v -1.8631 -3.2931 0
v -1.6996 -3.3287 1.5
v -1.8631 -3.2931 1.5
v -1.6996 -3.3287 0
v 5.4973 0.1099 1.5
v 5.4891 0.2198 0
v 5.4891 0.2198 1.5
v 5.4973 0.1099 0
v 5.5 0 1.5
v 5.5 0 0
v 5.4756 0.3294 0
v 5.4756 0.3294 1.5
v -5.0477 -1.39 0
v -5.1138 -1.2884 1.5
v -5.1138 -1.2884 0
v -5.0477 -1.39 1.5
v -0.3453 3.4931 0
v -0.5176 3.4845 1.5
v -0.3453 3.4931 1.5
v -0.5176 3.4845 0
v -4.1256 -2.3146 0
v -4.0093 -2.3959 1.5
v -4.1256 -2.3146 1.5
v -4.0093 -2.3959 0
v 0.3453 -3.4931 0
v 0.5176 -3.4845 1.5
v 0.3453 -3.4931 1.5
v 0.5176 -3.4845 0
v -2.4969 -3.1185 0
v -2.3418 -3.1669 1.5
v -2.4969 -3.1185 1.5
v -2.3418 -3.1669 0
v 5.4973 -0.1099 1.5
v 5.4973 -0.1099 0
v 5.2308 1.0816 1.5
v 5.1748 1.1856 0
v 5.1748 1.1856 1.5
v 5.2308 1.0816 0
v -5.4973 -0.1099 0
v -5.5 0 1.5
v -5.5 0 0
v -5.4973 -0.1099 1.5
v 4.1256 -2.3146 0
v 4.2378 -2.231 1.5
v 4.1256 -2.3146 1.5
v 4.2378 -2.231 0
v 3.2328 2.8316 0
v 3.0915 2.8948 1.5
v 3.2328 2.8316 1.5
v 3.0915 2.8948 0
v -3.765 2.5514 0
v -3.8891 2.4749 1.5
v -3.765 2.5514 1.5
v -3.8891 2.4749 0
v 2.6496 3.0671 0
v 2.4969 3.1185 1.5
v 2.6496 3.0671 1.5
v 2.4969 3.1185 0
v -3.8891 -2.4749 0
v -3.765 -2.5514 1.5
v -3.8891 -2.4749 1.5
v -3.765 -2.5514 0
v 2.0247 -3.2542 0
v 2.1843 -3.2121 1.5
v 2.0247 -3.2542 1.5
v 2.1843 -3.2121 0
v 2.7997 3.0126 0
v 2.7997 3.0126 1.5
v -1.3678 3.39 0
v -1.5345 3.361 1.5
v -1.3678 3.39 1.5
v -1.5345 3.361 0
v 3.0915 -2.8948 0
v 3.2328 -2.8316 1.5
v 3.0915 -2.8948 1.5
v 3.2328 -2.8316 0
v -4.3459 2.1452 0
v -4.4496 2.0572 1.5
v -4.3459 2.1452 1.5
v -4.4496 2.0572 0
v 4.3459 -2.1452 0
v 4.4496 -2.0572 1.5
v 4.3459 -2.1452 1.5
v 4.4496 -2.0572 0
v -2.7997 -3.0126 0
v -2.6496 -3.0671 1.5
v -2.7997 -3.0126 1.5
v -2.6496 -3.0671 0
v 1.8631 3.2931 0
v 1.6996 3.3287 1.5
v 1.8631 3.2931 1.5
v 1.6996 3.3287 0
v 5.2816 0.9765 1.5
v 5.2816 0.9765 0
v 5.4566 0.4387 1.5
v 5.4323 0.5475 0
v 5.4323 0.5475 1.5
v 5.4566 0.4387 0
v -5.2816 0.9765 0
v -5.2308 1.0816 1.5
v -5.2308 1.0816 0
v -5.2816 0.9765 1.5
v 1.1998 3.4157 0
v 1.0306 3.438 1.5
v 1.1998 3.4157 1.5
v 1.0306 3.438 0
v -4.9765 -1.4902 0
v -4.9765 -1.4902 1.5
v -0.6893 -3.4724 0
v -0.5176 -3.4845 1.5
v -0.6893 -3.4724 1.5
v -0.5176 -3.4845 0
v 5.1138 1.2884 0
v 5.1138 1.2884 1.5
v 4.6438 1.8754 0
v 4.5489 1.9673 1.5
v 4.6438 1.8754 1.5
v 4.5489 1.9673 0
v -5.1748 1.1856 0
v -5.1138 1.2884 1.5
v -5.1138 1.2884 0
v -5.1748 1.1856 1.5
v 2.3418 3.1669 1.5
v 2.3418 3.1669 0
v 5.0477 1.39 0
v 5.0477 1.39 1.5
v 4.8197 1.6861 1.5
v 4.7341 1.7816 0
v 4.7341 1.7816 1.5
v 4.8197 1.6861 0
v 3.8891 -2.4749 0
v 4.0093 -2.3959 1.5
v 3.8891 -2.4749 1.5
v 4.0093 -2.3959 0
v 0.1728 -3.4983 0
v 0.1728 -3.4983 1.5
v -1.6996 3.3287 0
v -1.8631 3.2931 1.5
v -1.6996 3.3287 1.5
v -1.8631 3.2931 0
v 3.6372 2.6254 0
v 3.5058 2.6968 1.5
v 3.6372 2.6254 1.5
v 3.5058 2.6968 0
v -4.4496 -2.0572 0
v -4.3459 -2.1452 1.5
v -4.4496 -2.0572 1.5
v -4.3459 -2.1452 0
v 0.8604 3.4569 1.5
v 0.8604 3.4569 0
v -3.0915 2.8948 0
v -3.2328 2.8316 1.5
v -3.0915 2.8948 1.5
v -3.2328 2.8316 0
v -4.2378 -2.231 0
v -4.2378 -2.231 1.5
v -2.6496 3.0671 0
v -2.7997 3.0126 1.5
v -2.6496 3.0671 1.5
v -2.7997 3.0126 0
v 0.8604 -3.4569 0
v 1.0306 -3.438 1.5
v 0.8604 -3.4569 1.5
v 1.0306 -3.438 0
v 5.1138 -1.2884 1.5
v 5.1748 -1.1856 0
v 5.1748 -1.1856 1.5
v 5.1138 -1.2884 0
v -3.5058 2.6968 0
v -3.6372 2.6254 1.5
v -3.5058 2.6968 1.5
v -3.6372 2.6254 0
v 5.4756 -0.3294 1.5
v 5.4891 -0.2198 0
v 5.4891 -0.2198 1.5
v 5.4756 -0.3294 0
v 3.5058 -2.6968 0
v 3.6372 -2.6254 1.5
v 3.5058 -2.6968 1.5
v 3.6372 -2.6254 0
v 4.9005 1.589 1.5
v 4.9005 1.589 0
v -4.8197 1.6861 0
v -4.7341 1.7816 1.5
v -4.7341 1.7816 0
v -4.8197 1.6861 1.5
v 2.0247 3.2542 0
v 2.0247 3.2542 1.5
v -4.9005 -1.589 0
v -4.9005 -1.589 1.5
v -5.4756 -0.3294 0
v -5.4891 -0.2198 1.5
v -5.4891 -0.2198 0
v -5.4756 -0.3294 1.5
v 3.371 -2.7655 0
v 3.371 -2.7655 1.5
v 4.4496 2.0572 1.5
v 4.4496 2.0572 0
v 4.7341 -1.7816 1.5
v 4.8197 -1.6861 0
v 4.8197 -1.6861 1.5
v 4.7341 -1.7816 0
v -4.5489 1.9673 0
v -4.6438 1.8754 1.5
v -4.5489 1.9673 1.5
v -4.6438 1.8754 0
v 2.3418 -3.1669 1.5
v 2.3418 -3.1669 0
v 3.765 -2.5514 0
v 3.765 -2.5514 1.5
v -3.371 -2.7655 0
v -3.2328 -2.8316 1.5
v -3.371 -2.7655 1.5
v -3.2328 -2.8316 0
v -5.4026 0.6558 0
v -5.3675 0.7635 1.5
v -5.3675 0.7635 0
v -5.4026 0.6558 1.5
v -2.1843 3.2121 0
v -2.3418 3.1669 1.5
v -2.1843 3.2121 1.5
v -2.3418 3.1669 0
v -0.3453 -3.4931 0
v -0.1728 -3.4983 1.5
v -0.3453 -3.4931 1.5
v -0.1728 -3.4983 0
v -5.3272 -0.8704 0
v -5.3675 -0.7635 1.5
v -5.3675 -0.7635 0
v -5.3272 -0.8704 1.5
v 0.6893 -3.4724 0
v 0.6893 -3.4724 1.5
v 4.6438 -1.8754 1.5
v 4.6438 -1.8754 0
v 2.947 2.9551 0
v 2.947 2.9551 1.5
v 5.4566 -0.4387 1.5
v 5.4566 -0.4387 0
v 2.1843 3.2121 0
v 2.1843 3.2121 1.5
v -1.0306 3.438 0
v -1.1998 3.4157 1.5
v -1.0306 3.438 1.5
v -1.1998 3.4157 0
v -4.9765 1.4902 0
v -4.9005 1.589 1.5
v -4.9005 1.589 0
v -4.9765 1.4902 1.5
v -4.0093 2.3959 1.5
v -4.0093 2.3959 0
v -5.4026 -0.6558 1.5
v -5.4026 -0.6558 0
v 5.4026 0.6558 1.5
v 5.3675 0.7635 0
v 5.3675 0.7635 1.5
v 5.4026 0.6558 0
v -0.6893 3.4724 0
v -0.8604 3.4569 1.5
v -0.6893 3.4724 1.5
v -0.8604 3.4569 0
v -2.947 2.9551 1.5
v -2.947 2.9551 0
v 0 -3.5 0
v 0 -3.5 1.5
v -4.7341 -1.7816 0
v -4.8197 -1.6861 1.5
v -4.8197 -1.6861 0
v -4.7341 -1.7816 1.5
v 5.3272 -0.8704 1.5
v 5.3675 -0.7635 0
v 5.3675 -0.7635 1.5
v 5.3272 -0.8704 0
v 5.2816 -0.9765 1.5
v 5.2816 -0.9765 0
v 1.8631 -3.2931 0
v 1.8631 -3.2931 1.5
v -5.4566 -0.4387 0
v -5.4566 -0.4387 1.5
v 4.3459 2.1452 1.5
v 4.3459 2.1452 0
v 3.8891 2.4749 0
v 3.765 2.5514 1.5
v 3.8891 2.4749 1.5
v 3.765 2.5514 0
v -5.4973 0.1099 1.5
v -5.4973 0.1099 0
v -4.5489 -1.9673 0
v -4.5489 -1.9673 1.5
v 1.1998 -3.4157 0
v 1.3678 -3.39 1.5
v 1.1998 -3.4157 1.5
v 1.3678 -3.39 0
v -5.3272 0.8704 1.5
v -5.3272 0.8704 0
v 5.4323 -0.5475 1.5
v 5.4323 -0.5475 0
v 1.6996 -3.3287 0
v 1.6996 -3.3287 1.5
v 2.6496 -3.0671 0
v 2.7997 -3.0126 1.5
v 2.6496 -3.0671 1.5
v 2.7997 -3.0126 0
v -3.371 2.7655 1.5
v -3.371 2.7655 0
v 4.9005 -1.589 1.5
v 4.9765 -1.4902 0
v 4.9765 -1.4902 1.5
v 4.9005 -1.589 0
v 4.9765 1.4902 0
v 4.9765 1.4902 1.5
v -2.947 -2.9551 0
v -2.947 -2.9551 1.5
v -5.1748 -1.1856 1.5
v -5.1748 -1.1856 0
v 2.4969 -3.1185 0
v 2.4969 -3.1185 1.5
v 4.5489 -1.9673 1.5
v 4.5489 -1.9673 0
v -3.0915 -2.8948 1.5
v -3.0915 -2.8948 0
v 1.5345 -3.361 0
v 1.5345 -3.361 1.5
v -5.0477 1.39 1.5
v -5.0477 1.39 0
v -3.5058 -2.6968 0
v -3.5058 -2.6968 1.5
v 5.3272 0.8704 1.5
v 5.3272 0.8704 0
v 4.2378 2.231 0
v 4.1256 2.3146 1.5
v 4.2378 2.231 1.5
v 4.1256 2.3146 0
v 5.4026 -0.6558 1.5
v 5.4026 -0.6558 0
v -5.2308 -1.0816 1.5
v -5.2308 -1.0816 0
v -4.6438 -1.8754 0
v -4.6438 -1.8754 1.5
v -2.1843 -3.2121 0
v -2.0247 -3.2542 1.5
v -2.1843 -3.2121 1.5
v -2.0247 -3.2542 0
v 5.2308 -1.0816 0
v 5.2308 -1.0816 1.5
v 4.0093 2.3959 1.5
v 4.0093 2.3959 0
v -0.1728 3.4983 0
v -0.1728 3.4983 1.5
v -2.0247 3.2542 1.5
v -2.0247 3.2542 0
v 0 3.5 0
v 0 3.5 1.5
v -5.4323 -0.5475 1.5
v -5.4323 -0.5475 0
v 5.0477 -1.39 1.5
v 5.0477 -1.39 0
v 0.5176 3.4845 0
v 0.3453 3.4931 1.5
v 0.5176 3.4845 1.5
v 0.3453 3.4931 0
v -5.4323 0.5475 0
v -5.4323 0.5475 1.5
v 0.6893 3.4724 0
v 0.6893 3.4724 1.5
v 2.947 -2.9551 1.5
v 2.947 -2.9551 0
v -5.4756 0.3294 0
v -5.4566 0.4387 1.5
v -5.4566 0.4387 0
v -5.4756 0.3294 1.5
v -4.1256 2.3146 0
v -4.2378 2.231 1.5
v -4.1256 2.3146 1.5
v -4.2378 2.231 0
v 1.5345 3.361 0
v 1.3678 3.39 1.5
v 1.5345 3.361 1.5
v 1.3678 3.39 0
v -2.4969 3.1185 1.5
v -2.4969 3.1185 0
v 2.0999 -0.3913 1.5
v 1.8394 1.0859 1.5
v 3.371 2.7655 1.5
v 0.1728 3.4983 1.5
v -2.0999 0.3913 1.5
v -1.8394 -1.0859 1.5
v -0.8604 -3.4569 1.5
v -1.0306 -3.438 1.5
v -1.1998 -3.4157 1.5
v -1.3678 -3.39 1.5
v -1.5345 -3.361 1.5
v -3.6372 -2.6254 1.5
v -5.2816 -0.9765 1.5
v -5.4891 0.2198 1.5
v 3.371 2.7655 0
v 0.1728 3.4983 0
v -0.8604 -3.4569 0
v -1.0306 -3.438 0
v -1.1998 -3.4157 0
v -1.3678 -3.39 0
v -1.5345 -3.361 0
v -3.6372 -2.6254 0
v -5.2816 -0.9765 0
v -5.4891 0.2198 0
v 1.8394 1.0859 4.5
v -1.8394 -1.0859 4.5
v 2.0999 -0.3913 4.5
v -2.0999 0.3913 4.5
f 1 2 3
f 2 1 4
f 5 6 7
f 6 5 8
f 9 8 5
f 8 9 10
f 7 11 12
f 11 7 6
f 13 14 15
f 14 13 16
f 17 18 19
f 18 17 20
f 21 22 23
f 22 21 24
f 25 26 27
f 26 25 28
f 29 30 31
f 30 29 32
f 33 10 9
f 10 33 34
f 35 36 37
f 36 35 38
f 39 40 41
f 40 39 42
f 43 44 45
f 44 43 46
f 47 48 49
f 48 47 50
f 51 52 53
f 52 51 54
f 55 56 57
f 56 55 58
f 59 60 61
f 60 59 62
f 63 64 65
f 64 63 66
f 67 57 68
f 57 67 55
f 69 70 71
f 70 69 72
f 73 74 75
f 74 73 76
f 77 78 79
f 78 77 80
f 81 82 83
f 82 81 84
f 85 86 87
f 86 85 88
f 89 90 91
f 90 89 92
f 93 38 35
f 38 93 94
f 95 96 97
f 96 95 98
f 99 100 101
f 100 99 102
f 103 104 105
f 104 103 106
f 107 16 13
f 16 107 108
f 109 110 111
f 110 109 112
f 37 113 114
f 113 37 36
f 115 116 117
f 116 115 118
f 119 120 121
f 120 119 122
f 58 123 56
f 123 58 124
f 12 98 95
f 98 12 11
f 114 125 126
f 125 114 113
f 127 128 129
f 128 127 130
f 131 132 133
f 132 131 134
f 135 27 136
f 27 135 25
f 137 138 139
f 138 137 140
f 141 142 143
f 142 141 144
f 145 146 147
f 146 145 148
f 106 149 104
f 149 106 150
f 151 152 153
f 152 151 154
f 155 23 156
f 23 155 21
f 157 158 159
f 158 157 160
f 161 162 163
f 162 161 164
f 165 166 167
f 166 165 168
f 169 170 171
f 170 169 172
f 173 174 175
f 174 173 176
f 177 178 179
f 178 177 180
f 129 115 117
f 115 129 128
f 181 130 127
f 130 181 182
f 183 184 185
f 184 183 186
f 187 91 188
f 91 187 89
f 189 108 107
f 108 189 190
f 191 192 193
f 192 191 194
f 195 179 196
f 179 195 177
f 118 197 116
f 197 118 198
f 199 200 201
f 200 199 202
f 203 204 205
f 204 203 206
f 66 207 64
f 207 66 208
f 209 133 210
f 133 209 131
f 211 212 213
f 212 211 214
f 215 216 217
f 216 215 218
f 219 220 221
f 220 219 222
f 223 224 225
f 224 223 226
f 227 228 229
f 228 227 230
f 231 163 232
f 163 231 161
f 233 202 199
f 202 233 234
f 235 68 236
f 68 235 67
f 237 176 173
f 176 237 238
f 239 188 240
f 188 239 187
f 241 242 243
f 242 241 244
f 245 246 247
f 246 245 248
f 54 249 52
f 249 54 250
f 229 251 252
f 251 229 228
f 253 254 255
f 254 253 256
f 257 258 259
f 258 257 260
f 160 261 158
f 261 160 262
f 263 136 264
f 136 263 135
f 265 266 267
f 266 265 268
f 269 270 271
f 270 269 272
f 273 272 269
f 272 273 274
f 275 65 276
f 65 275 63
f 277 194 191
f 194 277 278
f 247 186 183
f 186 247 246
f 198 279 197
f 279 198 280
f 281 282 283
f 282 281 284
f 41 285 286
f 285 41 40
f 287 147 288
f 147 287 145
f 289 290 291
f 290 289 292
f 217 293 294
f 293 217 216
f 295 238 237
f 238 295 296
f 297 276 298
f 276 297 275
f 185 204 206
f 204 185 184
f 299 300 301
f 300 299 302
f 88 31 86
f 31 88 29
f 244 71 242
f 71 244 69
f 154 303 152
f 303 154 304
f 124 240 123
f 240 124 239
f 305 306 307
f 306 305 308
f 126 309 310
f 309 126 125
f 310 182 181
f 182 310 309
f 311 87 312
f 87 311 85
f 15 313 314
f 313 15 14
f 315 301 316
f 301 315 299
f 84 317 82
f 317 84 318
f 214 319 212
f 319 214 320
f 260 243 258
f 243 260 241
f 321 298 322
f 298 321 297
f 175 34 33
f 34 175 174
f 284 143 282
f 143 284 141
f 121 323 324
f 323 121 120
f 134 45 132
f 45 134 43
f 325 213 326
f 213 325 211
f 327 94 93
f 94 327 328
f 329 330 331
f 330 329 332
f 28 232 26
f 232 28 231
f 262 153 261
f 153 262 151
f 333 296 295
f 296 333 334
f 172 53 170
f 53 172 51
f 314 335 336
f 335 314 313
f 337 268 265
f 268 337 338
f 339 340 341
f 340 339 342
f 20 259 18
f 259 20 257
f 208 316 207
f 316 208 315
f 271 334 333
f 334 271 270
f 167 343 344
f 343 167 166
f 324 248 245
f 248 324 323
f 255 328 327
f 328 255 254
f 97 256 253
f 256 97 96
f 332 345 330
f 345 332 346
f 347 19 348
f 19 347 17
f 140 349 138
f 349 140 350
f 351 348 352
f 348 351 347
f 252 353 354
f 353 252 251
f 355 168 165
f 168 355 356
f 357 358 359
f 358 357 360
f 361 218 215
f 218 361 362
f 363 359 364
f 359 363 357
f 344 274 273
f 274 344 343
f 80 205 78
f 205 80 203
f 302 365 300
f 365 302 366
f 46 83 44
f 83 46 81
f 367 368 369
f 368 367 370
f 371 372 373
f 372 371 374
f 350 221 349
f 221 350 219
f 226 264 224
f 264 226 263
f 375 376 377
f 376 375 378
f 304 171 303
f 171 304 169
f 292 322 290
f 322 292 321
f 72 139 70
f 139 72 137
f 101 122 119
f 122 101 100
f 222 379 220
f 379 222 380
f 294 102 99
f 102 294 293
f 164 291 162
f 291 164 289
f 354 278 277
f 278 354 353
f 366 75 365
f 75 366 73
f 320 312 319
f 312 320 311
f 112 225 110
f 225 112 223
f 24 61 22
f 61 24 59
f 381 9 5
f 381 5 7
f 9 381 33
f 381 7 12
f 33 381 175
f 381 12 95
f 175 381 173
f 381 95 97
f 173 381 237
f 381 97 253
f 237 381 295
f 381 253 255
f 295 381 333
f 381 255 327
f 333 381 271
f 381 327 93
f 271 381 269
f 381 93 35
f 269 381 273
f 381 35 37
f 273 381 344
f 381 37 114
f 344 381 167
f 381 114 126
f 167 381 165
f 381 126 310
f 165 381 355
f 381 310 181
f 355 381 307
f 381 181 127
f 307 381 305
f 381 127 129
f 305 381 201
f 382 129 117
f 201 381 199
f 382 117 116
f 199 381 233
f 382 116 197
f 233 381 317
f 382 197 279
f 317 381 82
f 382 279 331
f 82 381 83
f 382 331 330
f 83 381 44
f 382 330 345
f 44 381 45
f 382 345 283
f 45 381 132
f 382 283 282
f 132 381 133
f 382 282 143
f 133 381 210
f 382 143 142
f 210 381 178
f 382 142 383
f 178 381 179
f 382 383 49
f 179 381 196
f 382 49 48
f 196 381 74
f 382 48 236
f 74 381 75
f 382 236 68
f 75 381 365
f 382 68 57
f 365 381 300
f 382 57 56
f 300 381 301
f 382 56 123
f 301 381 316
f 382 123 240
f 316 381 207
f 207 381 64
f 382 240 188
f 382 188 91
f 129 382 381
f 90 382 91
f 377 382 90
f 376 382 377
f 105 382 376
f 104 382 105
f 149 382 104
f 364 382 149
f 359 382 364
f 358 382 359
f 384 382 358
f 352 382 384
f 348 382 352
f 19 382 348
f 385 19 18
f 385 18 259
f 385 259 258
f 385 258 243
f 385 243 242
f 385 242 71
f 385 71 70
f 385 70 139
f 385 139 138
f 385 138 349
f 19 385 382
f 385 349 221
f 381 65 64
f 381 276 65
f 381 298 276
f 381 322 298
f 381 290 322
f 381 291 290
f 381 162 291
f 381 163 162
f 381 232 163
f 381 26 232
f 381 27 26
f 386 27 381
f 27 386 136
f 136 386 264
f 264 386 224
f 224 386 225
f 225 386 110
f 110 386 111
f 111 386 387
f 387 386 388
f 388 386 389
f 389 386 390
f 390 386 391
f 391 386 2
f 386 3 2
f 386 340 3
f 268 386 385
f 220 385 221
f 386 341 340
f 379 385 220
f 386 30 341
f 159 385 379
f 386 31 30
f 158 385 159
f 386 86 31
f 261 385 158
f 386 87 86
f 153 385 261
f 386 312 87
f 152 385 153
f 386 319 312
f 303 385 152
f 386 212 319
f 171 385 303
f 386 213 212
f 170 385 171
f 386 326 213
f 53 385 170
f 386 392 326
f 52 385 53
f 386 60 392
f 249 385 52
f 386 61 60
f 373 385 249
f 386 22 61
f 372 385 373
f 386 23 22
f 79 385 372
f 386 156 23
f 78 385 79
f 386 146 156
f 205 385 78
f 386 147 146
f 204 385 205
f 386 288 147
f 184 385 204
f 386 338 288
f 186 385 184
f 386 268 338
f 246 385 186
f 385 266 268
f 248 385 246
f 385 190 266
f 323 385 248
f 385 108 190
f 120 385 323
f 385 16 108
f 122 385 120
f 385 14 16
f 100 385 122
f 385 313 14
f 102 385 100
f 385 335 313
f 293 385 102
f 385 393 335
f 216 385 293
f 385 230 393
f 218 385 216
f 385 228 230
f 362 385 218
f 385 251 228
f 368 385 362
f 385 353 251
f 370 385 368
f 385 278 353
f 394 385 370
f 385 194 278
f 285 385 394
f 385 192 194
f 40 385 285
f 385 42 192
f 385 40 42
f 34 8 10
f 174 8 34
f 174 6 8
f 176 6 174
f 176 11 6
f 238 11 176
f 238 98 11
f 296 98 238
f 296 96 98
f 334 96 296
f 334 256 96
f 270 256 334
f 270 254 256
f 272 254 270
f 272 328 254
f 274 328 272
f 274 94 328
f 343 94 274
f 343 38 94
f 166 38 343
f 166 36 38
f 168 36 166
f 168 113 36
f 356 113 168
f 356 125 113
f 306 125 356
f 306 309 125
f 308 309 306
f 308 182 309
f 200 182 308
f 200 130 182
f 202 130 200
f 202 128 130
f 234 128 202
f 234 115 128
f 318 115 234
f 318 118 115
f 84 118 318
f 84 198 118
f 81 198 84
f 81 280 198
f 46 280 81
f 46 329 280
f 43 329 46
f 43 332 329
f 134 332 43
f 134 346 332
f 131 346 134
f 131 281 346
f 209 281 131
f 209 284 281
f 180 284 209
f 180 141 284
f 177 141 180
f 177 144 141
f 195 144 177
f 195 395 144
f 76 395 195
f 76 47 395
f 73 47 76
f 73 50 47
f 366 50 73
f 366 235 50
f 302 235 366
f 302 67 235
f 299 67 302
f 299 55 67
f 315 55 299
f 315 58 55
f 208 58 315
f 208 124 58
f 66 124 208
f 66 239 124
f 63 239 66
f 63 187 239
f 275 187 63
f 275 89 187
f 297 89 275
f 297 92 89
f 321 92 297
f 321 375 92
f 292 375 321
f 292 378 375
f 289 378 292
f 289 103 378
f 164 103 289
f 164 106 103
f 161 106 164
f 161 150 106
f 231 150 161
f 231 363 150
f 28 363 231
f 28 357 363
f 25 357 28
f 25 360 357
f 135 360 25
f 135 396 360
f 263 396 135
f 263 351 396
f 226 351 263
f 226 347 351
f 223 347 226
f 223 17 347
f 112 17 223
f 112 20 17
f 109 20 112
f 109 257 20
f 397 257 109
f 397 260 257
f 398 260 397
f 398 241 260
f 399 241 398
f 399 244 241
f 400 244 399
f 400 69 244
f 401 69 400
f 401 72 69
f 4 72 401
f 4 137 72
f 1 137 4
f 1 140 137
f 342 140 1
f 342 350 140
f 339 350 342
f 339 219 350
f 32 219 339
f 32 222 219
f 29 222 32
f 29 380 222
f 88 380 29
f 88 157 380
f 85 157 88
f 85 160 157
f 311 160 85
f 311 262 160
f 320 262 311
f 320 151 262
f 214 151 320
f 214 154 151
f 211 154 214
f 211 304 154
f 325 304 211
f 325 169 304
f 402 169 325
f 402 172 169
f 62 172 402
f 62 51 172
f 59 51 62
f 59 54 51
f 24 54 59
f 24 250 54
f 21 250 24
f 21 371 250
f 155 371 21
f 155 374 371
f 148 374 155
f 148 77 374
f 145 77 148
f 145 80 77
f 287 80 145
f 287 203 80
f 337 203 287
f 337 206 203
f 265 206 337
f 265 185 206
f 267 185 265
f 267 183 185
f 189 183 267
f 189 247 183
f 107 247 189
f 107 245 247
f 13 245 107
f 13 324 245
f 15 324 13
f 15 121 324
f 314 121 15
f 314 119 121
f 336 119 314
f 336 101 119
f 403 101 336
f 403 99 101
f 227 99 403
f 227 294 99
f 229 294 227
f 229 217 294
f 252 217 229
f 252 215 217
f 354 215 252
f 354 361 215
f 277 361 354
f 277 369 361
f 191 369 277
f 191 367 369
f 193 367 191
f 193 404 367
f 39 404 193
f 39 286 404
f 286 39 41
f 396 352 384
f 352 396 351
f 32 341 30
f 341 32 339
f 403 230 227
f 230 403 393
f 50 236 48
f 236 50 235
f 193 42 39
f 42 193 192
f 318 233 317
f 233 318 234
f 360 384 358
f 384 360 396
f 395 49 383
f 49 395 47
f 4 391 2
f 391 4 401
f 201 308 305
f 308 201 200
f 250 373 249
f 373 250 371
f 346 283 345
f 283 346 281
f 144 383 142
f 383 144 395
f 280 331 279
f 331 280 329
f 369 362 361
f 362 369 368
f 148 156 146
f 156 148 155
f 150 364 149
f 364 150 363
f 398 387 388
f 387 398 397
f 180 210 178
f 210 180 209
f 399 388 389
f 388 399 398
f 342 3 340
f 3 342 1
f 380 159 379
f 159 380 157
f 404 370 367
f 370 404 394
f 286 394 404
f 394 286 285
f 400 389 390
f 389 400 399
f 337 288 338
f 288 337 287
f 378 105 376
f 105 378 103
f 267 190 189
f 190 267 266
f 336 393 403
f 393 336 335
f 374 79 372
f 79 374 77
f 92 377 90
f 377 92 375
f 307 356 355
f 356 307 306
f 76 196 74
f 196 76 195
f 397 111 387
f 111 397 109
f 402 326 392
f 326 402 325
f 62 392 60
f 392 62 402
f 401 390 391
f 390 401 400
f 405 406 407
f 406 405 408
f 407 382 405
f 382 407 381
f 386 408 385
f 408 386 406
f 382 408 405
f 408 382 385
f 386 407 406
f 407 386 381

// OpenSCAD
//Set resolution - best to leave at 200
$fn = 200; 

//Radius of pad (long)
l = 5.5; 

//Radius of pad (short)
w = 3.5; 

//Thickness of pad
t = 1.5; 

//Pin length
pl = 4; 

//Pin width
pw = 1.5; 

//Pin height
ph = 3; 

//Pin rotation (degrees)
pr = 10;

//Add oval module
module oval(w,h, height, center = false) { 
  scale([1, h/w, 1]) cylinder(h=height, r=w, center=center);
}



oval(l,w,t);
rotate([0,0,pr])
translate([-pl/2,-pw/2,0])
cube([pl,pw,ph+t]);
